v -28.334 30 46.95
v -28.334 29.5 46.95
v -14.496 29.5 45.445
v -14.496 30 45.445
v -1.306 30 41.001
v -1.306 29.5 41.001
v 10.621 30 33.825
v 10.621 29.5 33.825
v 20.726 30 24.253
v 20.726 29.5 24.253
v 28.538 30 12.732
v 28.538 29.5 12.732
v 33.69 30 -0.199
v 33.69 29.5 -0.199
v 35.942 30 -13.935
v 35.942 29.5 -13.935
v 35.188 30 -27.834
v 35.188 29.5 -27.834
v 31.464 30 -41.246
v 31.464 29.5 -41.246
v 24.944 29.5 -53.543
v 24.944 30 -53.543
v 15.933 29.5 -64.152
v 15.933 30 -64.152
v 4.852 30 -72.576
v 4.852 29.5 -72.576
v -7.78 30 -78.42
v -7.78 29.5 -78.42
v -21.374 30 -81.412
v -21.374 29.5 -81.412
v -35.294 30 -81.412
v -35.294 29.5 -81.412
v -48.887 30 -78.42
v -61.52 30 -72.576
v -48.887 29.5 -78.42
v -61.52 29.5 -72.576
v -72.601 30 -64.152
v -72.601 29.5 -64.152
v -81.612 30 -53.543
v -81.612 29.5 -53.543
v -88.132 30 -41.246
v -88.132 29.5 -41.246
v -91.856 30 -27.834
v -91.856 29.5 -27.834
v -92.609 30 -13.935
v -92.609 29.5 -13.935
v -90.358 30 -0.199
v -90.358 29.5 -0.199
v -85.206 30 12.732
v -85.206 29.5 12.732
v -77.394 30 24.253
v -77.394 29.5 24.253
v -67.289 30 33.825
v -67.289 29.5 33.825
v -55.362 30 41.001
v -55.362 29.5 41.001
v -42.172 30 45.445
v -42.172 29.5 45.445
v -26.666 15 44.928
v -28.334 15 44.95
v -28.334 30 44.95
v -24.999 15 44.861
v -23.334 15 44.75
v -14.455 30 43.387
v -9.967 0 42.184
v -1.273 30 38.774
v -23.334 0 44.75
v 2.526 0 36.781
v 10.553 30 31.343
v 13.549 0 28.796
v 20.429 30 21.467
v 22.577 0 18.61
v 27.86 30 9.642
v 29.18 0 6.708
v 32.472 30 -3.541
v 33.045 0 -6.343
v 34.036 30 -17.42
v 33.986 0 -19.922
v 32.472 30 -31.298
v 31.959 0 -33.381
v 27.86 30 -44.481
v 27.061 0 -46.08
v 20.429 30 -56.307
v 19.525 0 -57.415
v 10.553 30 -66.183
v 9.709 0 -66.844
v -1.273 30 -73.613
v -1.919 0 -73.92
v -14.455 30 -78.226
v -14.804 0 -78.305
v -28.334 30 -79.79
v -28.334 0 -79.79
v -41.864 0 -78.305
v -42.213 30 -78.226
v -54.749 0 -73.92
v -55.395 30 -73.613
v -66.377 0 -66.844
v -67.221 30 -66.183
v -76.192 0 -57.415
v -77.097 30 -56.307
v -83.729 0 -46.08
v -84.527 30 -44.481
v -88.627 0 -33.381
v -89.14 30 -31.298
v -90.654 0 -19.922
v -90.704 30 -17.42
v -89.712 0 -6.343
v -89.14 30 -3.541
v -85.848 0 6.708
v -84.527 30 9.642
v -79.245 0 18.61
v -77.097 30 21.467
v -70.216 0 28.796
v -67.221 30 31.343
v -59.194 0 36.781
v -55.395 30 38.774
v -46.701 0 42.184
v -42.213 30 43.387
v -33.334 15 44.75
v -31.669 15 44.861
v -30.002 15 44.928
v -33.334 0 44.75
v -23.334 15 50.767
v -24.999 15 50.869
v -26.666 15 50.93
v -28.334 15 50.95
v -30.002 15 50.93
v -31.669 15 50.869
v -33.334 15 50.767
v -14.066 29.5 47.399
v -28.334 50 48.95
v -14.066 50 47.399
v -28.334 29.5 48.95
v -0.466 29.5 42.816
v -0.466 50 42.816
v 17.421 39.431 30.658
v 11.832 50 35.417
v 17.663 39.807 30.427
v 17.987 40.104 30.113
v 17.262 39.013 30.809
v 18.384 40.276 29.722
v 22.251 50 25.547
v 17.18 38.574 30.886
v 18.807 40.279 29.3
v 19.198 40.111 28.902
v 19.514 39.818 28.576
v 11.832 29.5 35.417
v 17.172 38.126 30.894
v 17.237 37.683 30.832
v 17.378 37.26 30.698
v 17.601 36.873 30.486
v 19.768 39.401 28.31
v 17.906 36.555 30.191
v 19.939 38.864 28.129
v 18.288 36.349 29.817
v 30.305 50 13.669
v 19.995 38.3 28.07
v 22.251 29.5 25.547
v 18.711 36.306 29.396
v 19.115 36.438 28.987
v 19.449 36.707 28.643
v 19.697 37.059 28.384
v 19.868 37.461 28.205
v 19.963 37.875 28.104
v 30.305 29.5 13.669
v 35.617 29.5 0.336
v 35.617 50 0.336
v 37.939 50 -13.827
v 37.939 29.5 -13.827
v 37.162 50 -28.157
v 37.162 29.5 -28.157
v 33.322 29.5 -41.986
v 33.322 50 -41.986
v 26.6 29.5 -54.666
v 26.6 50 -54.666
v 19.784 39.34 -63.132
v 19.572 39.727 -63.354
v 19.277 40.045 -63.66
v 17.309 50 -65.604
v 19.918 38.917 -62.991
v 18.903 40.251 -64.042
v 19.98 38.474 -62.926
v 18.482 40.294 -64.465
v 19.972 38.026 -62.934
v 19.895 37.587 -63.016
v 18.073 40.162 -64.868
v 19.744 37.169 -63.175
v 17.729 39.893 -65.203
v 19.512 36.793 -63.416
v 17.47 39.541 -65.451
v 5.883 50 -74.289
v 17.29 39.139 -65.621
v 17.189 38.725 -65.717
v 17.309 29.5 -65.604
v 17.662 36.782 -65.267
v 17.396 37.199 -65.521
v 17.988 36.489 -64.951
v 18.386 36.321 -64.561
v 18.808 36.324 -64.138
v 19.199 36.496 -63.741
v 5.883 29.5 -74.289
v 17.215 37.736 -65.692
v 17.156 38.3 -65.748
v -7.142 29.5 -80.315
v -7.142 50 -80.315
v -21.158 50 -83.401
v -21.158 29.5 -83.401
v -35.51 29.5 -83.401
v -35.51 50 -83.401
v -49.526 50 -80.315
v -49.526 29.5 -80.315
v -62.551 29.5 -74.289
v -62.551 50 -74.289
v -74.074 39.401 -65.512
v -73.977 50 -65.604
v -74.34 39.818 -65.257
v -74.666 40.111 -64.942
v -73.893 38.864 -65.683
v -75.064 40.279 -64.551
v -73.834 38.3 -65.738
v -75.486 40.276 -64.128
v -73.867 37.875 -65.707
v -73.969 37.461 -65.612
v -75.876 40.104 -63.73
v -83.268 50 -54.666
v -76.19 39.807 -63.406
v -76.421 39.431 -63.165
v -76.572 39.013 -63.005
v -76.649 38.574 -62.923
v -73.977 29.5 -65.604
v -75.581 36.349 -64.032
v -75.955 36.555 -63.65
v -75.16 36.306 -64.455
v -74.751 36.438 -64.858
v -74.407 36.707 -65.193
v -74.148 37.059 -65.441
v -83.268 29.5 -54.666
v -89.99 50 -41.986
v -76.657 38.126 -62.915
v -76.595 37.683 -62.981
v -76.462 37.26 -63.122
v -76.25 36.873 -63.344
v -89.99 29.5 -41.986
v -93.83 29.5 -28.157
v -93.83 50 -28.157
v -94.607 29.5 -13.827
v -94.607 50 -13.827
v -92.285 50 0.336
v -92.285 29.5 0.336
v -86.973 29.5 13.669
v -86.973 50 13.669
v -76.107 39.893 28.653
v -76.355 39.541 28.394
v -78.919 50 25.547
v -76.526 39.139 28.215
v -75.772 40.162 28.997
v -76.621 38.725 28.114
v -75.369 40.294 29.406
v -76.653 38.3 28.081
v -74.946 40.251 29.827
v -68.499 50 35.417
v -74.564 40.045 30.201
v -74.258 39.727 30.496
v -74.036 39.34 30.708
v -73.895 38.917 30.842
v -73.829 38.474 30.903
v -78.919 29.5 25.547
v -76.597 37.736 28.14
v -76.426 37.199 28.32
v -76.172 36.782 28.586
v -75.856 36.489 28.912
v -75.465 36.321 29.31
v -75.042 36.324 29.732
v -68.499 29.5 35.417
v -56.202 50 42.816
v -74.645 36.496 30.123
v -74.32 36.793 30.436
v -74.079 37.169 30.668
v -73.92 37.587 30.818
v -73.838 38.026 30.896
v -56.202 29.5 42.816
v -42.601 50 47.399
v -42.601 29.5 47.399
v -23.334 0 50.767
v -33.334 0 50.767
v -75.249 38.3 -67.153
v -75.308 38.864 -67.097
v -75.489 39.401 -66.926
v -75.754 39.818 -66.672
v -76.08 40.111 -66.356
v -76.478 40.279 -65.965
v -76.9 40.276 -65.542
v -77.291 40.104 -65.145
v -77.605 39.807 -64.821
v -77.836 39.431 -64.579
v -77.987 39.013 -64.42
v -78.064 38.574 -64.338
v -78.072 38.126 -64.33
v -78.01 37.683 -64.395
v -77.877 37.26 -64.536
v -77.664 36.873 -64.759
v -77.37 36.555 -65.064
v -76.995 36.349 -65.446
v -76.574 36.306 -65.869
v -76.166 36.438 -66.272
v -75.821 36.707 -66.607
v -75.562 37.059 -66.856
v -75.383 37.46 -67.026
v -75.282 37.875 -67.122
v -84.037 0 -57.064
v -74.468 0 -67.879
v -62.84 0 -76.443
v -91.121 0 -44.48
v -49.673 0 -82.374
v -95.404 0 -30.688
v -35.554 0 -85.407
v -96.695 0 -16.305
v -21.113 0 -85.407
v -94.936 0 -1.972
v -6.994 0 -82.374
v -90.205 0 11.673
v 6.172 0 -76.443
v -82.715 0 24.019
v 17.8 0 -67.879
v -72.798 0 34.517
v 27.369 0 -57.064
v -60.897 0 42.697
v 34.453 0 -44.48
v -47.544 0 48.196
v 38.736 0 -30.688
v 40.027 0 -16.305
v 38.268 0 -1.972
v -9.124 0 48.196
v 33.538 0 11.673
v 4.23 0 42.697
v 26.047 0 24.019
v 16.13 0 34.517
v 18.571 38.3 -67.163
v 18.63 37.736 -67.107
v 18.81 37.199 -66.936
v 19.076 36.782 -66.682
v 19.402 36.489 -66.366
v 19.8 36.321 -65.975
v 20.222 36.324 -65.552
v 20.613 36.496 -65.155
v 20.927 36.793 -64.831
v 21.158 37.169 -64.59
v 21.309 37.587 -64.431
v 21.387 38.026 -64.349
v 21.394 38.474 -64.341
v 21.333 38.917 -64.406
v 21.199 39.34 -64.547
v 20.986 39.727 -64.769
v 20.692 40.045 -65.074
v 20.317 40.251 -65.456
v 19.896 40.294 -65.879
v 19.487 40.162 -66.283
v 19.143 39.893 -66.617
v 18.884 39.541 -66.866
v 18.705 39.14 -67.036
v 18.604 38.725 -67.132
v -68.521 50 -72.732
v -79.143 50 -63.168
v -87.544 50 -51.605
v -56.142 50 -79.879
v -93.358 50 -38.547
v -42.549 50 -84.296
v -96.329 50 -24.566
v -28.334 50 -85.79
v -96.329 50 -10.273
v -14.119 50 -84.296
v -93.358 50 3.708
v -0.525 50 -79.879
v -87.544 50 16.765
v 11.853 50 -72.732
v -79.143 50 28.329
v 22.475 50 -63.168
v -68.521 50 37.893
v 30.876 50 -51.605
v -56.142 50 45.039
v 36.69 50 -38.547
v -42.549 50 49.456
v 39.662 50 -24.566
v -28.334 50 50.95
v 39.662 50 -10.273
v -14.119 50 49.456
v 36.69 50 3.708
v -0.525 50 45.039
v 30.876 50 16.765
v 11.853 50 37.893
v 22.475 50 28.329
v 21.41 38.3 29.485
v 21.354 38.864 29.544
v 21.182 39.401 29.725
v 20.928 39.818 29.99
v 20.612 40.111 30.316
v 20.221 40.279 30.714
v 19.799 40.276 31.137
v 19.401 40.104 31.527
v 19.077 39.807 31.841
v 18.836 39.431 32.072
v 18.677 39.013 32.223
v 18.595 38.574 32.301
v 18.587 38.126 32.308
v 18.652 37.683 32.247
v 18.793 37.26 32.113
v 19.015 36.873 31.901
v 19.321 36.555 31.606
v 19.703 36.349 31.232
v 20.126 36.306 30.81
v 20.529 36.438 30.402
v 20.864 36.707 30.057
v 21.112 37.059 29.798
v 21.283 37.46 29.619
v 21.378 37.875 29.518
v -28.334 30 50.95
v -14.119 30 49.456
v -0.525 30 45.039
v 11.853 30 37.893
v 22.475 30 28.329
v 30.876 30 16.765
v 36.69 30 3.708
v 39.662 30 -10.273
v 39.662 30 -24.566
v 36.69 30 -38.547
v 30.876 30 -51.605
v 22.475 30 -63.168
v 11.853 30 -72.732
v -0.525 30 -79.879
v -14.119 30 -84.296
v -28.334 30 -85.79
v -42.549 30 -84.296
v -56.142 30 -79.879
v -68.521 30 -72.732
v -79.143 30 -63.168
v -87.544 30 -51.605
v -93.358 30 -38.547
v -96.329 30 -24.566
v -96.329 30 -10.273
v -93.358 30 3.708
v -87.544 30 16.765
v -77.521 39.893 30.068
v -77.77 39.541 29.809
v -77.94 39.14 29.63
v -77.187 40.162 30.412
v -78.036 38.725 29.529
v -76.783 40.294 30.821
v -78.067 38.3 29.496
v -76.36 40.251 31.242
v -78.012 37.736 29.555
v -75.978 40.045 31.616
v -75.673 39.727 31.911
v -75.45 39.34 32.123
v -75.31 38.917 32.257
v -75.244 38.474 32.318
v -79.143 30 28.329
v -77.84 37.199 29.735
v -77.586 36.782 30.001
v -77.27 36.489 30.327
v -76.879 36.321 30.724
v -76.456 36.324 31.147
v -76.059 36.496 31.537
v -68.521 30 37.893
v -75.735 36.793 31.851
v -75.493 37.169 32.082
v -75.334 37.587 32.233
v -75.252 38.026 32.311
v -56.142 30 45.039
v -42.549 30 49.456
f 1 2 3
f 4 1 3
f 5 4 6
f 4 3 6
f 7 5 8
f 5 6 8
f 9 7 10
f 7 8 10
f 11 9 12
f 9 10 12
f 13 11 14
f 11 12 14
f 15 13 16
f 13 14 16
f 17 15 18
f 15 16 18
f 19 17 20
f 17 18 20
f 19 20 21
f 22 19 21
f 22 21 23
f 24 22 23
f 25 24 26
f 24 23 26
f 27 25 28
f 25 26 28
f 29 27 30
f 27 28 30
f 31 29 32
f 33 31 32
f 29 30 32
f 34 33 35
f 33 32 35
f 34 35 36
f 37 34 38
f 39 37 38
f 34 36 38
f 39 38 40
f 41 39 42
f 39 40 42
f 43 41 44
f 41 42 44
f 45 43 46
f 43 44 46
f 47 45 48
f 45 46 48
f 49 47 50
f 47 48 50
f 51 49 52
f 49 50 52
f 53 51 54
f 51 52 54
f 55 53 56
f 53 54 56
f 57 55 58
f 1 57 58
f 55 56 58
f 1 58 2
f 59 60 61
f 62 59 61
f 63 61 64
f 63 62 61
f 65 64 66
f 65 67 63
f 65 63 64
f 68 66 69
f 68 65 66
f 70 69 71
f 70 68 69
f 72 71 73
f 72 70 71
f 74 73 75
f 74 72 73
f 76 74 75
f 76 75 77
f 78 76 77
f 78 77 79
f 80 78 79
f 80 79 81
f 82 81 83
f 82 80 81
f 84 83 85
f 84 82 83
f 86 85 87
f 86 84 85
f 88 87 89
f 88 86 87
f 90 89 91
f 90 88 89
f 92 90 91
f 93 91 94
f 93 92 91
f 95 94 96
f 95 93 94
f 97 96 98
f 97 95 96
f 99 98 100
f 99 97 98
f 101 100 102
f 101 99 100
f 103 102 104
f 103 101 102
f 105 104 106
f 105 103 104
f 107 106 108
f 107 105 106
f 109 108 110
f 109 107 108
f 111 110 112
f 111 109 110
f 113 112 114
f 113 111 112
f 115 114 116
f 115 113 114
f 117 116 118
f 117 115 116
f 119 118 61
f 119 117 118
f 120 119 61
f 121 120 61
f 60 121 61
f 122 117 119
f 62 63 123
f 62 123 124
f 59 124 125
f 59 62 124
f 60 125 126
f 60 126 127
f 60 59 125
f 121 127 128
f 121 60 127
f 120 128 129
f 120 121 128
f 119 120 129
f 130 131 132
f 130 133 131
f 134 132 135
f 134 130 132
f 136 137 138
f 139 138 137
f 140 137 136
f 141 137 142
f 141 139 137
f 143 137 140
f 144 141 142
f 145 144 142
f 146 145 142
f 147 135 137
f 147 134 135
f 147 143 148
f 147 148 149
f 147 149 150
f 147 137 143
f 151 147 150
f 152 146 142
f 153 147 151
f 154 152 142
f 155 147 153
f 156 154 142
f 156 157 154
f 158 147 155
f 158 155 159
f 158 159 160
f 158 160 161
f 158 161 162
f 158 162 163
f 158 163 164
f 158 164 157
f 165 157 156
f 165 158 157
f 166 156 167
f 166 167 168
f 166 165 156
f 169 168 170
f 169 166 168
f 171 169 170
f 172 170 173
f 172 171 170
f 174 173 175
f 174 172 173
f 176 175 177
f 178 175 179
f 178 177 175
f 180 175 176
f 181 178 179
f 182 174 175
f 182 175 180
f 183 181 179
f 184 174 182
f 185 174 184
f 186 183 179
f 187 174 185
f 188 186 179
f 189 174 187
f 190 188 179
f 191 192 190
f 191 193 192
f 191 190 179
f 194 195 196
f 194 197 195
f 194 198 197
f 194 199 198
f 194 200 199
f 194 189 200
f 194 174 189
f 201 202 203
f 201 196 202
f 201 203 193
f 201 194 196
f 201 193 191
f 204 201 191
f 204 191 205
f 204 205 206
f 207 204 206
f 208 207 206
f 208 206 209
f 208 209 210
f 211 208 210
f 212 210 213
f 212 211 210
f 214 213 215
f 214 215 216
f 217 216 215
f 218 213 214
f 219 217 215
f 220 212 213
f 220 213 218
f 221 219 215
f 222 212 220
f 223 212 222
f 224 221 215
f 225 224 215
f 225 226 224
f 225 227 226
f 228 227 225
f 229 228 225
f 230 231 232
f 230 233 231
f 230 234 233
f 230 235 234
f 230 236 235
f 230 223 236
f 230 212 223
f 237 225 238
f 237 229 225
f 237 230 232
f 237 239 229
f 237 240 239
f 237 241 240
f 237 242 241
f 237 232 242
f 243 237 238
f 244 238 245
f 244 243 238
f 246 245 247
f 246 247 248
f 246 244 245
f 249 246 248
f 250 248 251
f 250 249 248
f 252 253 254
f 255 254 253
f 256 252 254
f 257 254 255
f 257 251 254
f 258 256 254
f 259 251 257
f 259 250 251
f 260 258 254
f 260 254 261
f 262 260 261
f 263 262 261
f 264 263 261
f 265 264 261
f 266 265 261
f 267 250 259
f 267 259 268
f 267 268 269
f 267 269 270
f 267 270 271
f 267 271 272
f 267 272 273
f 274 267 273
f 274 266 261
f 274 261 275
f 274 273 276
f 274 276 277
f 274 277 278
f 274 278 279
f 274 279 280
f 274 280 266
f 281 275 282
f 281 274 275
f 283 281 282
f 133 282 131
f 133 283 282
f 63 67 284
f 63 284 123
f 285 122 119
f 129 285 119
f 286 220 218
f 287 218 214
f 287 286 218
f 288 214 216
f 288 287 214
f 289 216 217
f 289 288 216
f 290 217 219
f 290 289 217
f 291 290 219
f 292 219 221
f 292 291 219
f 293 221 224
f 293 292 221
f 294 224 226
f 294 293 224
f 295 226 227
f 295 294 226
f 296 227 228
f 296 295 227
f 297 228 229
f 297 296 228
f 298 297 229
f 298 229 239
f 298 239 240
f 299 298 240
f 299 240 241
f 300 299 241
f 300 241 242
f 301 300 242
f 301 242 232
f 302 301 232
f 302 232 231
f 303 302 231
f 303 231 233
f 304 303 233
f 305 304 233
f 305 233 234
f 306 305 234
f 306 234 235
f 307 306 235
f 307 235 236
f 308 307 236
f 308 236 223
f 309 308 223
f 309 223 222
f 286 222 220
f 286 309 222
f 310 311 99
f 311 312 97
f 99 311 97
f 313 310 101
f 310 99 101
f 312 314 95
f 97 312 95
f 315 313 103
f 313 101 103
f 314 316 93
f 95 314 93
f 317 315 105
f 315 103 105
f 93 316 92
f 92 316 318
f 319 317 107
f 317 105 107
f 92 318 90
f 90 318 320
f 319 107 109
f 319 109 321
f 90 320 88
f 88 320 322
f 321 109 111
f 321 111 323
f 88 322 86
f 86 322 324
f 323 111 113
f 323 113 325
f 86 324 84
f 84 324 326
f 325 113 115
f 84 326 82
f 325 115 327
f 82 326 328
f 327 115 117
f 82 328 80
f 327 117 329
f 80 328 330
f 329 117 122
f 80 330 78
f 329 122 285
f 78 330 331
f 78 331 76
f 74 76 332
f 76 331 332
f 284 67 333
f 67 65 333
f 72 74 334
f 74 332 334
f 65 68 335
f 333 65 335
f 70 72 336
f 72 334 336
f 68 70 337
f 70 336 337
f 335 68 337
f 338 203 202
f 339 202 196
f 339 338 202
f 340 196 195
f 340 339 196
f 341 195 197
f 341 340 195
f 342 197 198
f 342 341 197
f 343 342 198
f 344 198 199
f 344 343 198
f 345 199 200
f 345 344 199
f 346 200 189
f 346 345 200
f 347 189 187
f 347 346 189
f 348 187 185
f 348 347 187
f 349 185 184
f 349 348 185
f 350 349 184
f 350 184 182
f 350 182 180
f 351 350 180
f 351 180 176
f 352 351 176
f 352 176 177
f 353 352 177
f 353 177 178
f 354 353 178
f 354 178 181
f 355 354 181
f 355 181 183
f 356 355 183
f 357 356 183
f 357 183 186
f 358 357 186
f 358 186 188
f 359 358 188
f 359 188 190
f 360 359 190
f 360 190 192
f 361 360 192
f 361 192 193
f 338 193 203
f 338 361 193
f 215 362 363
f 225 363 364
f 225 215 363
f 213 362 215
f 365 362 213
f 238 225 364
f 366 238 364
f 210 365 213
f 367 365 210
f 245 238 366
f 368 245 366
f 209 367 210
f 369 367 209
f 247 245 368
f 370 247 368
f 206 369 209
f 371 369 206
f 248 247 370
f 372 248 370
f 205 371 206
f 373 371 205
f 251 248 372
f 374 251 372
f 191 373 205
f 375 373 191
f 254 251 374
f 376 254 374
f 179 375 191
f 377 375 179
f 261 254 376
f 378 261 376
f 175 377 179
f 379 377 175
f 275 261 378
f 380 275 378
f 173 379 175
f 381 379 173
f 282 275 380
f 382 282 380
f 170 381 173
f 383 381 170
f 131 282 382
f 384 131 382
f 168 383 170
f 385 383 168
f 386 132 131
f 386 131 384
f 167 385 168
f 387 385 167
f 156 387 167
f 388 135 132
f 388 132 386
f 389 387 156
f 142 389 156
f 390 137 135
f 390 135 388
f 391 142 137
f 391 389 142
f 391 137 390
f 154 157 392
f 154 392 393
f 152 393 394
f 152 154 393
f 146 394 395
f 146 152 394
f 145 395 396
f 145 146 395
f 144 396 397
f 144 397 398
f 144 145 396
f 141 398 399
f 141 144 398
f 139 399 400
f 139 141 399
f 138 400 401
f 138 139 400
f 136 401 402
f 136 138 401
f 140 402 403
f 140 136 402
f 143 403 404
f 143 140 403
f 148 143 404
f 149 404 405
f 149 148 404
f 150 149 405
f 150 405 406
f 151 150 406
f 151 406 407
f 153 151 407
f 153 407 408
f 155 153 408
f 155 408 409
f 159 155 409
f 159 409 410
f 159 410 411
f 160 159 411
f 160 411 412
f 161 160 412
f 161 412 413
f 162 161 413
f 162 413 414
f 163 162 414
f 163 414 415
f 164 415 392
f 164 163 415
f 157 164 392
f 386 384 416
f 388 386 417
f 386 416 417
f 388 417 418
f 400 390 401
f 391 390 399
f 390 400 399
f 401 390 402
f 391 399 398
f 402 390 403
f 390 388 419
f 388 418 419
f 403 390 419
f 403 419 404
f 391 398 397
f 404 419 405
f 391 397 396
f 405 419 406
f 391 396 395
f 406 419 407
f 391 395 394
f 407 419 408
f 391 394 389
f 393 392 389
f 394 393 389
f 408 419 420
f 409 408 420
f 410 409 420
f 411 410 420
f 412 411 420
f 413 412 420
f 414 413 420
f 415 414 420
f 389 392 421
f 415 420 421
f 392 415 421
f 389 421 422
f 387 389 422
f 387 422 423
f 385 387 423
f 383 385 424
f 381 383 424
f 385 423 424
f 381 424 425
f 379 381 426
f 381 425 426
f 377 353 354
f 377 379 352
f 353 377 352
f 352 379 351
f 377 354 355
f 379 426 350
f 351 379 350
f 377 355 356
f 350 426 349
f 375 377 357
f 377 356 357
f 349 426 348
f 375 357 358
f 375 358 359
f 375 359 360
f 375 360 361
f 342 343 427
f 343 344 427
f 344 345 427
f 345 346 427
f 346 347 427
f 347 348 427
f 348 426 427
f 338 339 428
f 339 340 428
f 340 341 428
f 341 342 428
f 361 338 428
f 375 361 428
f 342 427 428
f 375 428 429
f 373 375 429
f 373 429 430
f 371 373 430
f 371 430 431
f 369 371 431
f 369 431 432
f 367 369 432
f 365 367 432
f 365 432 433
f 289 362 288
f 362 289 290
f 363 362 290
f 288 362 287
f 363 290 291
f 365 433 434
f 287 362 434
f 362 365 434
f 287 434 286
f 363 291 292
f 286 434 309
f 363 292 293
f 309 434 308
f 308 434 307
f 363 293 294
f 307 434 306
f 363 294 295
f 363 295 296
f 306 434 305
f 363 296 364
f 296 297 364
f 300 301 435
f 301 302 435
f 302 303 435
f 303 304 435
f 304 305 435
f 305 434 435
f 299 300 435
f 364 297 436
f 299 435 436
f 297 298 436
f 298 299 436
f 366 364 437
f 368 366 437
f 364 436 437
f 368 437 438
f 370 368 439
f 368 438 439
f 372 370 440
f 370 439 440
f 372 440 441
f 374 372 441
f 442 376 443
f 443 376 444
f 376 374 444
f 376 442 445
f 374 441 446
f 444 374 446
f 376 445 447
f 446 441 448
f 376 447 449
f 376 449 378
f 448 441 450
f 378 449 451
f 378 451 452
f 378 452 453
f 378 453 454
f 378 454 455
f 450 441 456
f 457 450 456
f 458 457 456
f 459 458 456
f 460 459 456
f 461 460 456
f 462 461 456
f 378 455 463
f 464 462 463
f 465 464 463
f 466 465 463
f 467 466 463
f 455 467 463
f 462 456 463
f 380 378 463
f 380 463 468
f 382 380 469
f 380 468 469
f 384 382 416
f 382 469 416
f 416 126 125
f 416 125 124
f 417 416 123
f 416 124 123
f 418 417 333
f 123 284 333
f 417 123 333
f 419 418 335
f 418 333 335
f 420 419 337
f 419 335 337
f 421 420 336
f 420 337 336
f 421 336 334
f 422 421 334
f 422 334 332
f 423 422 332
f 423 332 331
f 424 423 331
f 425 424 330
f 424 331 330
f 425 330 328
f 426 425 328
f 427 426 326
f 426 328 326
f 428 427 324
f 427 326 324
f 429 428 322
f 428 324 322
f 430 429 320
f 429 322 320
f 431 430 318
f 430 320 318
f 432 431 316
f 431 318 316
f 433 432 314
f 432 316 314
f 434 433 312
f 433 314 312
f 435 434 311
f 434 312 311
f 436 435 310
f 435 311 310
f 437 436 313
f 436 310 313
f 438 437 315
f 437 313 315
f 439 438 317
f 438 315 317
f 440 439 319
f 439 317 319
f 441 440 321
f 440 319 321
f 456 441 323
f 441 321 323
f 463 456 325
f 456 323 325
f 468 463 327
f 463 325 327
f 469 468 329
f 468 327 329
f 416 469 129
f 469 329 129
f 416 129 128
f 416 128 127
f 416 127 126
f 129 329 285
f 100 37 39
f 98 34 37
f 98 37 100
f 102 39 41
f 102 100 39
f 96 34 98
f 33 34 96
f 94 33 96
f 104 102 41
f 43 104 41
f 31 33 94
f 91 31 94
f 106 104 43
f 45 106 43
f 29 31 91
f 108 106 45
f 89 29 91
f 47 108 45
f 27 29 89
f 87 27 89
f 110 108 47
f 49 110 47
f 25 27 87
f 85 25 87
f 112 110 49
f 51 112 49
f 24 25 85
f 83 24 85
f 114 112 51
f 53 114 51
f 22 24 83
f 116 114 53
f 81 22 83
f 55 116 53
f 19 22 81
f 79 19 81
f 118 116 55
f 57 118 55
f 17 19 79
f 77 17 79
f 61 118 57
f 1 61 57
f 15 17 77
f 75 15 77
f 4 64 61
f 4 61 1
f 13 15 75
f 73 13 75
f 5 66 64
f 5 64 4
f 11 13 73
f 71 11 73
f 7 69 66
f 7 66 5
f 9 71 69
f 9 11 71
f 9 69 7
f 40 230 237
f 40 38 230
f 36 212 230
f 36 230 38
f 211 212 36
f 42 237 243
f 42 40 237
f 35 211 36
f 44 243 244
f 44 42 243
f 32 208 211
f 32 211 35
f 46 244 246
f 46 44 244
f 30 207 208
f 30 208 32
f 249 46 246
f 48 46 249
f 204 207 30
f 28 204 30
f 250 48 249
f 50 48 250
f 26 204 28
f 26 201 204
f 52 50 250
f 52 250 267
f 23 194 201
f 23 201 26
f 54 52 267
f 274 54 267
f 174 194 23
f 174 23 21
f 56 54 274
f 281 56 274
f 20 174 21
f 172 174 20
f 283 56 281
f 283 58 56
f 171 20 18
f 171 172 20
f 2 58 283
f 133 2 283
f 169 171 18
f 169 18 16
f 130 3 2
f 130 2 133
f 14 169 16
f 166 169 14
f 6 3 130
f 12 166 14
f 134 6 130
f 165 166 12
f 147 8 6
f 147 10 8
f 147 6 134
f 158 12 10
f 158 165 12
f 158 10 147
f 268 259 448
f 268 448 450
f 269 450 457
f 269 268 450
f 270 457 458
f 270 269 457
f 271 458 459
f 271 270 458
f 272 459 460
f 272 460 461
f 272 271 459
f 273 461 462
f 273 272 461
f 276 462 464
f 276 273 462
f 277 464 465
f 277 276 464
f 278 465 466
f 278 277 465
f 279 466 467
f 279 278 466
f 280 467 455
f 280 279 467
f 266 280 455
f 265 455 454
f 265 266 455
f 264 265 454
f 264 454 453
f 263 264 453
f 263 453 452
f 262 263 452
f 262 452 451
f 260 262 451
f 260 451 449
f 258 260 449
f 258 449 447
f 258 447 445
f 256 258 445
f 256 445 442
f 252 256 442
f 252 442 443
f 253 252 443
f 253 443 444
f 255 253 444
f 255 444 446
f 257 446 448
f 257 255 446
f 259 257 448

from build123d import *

# Parameters (mm, degrees)
SKETCH1_R                = 68.369999998
SKETCH1_R_2              = 62.369999998
BOSS_EXTRUDE1_DEPTH      = 30
SKETCH68_R               = 68.369999998
SKETCH68_R_2             = 66.369999998
BOSS_EXTRUDE2_DEPTH      = 20
CUT_EXTRUDE8_START       = -0.5
SKETCH69_R               = 66.369999998
SKETCH69_R_2             = 64.369999998
CUT_EXTRUDE8_DEPTH       = 0.5
SKETCH72_W               = 10
SKETCH72_H               = 15
CUT_EXTRUDE9_DEPTH       = 129.553881543
CUT_EXTRUDE12_DEPTH      = 122.552738517
CUT_EXTRUDE12_DEPTH_BACK = 122.552738517
SKETCH75_R               = 2
CUT_EXTRUDE13_DEPTH      = 127.128190531
CUT_EXTRUDE13_DEPTH_BACK = 127.128190531
SKETCH76_R               = 2.000000001


with BuildPart() as part:
    # Sketch1 → Boss-Extrude1 (new body)
    with BuildSketch(Plane(origin=(0, 0, 0), x_dir=(-0.9985653746512714, 0, -0.053546172109368295), z_dir=(0, 1, 0))):
        with Locations(Location((29.226008494, -15.877583489, 0), (0, 0, 93.069437642))):
            Circle(SKETCH1_R)
        with Locations(Location((29.226008494, -15.877583489, 0), (0, 0, 93.069437642))):
            Circle(SKETCH1_R_2, mode=Mode.SUBTRACT)
    extrude(amount=BOSS_EXTRUDE1_DEPTH)

    # Sketch68 → Boss-Extrude2 (add)
    with BuildSketch(Plane(origin=(0, 30, 0), x_dir=(1, 0, 0), z_dir=(0, 1, 0))):
        with Locations(Location((-28.333896303, 17.419745986, 0), (0, 0, 270))):
            Circle(SKETCH68_R)
        with Locations(Location((-28.333896303, 17.419745986, 0), (0, 0, 270))):
            Circle(SKETCH68_R_2, mode=Mode.SUBTRACT)
    extrude(amount=BOSS_EXTRUDE2_DEPTH)

    # Sketch69 → Cut-Extrude8 (cut)
    with BuildSketch(Plane(origin=(0, 30, 0), x_dir=(1, 0, 0), z_dir=(0, 1, 0)).offset(CUT_EXTRUDE8_START)):
        with Locations(Location((-28.333896303, 17.419745986, 0), (0, 0, 270))):
            Circle(SKETCH69_R)
        with Locations(Location((-28.333896303, 17.419745986, 0), (0, 0, 270))):
            Circle(SKETCH69_R_2, mode=Mode.SUBTRACT)
    extrude(amount=CUT_EXTRUDE8_DEPTH, mode=Mode.SUBTRACT)

    # Sketch72 → Cut-Extrude9 (cut, through all)
    with BuildSketch(Plane(origin=(0, 0, -17.419745986), x_dir=(-1, 0, 0), z_dir=(0, 0, -1))):
        with Locations((28.333896303, 7.5)):
            Rectangle(SKETCH72_W, SKETCH72_H)
    extrude(amount=-CUT_EXTRUDE9_DEPTH, mode=Mode.SUBTRACT)

    # Sketch75 → Cut-Extrude12 (cut, two sides: drawn at the far end of the back side and taken through both)
    with BuildSketch(Plane(origin=(-27.926429367, 72.899932993, -17.0123656), x_dir=(0.7071818832479886, 0, 0.7070316711476428), z_dir=(-0.7070316711476428, 0, 0.7071818832479886)).offset(-CUT_EXTRUDE12_DEPTH_BACK)):
        with Locations(Location((-0.576184071, -34.599932993, 0), (0, 0, 180))):
            Circle(SKETCH75_R)
    extrude(amount=CUT_EXTRUDE12_DEPTH + CUT_EXTRUDE12_DEPTH_BACK, mode=Mode.SUBTRACT)

    # Sketch76 → Cut-Extrude13 (cut, two sides: drawn at the far end of the back side and taken through both)
    with BuildSketch(Plane(origin=(-32.743645602, 72.899932993, -13.009059816), x_dir=(0.7070316711476428, 0, -0.7071818832479886), z_dir=(0.7071818832479886, 0, 0.7070316711476428)).offset(-CUT_EXTRUDE13_DEPTH_BACK)):
        with Locations((6.236989769, -34.599932997)):
            Circle(SKETCH76_R)
    extrude(amount=CUT_EXTRUDE13_DEPTH + CUT_EXTRUDE13_DEPTH_BACK, mode=Mode.SUBTRACT)


solid = part.part
